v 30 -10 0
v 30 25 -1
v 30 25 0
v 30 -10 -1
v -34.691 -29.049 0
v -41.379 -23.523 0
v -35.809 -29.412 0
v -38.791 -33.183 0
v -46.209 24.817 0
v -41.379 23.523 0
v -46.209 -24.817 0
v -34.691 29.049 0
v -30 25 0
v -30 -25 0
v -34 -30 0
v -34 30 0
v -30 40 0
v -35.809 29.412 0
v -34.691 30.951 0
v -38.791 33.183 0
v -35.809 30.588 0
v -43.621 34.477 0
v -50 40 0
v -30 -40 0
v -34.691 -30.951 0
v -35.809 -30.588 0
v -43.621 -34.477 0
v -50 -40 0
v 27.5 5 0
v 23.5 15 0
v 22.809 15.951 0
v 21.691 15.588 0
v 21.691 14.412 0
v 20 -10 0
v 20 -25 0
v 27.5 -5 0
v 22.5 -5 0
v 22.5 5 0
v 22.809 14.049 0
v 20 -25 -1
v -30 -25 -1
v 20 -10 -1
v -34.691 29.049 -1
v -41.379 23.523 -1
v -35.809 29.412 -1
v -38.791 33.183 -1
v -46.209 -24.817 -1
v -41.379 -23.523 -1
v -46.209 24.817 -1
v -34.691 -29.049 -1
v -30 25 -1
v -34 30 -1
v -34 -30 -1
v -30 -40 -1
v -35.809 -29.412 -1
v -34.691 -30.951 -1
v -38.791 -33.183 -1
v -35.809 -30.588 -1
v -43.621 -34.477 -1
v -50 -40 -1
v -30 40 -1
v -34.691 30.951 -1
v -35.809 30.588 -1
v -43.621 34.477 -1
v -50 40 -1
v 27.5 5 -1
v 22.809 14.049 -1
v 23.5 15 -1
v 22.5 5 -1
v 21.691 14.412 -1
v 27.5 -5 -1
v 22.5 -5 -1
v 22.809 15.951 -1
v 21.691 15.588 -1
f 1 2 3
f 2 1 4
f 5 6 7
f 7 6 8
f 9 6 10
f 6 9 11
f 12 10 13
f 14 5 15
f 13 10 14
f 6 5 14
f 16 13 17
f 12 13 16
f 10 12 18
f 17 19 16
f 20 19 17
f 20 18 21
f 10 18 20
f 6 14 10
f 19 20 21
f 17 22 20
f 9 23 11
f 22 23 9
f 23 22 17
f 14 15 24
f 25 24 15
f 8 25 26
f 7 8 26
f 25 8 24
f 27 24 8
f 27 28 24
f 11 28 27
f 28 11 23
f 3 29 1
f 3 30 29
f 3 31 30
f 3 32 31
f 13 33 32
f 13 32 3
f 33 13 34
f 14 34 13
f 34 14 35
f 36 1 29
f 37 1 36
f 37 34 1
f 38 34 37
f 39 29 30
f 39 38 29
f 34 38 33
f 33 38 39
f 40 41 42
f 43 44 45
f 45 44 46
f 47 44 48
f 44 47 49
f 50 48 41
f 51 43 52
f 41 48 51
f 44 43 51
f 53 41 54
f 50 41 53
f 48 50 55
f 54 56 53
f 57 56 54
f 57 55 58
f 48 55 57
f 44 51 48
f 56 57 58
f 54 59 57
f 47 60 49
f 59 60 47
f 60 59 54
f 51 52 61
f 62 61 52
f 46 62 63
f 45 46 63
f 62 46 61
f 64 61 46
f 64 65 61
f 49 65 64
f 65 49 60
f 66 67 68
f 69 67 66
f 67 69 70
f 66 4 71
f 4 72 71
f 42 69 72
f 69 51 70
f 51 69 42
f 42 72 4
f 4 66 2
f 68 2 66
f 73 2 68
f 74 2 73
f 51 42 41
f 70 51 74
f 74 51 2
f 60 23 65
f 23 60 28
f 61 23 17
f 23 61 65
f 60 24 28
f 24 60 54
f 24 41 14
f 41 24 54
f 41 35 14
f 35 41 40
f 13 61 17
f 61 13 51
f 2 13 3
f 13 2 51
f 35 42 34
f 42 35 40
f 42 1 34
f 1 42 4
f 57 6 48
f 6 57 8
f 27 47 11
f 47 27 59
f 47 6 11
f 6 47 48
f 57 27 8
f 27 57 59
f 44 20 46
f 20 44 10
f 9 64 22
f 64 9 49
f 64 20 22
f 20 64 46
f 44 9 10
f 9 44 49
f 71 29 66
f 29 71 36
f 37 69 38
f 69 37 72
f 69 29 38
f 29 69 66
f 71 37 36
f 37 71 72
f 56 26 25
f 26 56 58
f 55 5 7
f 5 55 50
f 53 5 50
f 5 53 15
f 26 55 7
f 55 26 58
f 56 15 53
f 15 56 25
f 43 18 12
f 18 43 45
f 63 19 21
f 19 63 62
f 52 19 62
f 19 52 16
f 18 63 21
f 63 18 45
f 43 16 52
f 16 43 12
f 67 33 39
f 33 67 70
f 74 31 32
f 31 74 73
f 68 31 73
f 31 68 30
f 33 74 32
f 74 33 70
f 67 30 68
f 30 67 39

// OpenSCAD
module TCRT5K()
{
    cube([5, 10, 1], true);
}

difference()
{
    // Base
    translate([-50, -40, -1]) cube([80,80,1]);
    
    // Passage Roues
    translate([0, -32.5, -0.5]) cube([60, 15, 1], true);
    translate([0,  32.5, -0.5]) cube([60, 15, 1], true);
    
    // Passage Cable Batterie
    translate([25, -17.5, -0.5]) cube([10,15,1], true);
    
    // Passage Capteurs TCRT
    translate([-42.5, -29, -0.5]) rotate(a = [0, 0,  15]) TCRT5K();
    translate([-42.5,  29, -0.5]) rotate(a = [0, 0, -15]) TCRT5K();
    translate([ 25,   0, -0.5]) TCRT5K();
    
    // Vis assemblage
    translate([-35, -30, -1]) cylinder(h = 1, r = 1);
    translate([-35,  30, -1]) cylinder(h = 1, r = 1);
    translate([ 22.5,  15, -1]) cylinder(h = 1, r = 1);
}    
